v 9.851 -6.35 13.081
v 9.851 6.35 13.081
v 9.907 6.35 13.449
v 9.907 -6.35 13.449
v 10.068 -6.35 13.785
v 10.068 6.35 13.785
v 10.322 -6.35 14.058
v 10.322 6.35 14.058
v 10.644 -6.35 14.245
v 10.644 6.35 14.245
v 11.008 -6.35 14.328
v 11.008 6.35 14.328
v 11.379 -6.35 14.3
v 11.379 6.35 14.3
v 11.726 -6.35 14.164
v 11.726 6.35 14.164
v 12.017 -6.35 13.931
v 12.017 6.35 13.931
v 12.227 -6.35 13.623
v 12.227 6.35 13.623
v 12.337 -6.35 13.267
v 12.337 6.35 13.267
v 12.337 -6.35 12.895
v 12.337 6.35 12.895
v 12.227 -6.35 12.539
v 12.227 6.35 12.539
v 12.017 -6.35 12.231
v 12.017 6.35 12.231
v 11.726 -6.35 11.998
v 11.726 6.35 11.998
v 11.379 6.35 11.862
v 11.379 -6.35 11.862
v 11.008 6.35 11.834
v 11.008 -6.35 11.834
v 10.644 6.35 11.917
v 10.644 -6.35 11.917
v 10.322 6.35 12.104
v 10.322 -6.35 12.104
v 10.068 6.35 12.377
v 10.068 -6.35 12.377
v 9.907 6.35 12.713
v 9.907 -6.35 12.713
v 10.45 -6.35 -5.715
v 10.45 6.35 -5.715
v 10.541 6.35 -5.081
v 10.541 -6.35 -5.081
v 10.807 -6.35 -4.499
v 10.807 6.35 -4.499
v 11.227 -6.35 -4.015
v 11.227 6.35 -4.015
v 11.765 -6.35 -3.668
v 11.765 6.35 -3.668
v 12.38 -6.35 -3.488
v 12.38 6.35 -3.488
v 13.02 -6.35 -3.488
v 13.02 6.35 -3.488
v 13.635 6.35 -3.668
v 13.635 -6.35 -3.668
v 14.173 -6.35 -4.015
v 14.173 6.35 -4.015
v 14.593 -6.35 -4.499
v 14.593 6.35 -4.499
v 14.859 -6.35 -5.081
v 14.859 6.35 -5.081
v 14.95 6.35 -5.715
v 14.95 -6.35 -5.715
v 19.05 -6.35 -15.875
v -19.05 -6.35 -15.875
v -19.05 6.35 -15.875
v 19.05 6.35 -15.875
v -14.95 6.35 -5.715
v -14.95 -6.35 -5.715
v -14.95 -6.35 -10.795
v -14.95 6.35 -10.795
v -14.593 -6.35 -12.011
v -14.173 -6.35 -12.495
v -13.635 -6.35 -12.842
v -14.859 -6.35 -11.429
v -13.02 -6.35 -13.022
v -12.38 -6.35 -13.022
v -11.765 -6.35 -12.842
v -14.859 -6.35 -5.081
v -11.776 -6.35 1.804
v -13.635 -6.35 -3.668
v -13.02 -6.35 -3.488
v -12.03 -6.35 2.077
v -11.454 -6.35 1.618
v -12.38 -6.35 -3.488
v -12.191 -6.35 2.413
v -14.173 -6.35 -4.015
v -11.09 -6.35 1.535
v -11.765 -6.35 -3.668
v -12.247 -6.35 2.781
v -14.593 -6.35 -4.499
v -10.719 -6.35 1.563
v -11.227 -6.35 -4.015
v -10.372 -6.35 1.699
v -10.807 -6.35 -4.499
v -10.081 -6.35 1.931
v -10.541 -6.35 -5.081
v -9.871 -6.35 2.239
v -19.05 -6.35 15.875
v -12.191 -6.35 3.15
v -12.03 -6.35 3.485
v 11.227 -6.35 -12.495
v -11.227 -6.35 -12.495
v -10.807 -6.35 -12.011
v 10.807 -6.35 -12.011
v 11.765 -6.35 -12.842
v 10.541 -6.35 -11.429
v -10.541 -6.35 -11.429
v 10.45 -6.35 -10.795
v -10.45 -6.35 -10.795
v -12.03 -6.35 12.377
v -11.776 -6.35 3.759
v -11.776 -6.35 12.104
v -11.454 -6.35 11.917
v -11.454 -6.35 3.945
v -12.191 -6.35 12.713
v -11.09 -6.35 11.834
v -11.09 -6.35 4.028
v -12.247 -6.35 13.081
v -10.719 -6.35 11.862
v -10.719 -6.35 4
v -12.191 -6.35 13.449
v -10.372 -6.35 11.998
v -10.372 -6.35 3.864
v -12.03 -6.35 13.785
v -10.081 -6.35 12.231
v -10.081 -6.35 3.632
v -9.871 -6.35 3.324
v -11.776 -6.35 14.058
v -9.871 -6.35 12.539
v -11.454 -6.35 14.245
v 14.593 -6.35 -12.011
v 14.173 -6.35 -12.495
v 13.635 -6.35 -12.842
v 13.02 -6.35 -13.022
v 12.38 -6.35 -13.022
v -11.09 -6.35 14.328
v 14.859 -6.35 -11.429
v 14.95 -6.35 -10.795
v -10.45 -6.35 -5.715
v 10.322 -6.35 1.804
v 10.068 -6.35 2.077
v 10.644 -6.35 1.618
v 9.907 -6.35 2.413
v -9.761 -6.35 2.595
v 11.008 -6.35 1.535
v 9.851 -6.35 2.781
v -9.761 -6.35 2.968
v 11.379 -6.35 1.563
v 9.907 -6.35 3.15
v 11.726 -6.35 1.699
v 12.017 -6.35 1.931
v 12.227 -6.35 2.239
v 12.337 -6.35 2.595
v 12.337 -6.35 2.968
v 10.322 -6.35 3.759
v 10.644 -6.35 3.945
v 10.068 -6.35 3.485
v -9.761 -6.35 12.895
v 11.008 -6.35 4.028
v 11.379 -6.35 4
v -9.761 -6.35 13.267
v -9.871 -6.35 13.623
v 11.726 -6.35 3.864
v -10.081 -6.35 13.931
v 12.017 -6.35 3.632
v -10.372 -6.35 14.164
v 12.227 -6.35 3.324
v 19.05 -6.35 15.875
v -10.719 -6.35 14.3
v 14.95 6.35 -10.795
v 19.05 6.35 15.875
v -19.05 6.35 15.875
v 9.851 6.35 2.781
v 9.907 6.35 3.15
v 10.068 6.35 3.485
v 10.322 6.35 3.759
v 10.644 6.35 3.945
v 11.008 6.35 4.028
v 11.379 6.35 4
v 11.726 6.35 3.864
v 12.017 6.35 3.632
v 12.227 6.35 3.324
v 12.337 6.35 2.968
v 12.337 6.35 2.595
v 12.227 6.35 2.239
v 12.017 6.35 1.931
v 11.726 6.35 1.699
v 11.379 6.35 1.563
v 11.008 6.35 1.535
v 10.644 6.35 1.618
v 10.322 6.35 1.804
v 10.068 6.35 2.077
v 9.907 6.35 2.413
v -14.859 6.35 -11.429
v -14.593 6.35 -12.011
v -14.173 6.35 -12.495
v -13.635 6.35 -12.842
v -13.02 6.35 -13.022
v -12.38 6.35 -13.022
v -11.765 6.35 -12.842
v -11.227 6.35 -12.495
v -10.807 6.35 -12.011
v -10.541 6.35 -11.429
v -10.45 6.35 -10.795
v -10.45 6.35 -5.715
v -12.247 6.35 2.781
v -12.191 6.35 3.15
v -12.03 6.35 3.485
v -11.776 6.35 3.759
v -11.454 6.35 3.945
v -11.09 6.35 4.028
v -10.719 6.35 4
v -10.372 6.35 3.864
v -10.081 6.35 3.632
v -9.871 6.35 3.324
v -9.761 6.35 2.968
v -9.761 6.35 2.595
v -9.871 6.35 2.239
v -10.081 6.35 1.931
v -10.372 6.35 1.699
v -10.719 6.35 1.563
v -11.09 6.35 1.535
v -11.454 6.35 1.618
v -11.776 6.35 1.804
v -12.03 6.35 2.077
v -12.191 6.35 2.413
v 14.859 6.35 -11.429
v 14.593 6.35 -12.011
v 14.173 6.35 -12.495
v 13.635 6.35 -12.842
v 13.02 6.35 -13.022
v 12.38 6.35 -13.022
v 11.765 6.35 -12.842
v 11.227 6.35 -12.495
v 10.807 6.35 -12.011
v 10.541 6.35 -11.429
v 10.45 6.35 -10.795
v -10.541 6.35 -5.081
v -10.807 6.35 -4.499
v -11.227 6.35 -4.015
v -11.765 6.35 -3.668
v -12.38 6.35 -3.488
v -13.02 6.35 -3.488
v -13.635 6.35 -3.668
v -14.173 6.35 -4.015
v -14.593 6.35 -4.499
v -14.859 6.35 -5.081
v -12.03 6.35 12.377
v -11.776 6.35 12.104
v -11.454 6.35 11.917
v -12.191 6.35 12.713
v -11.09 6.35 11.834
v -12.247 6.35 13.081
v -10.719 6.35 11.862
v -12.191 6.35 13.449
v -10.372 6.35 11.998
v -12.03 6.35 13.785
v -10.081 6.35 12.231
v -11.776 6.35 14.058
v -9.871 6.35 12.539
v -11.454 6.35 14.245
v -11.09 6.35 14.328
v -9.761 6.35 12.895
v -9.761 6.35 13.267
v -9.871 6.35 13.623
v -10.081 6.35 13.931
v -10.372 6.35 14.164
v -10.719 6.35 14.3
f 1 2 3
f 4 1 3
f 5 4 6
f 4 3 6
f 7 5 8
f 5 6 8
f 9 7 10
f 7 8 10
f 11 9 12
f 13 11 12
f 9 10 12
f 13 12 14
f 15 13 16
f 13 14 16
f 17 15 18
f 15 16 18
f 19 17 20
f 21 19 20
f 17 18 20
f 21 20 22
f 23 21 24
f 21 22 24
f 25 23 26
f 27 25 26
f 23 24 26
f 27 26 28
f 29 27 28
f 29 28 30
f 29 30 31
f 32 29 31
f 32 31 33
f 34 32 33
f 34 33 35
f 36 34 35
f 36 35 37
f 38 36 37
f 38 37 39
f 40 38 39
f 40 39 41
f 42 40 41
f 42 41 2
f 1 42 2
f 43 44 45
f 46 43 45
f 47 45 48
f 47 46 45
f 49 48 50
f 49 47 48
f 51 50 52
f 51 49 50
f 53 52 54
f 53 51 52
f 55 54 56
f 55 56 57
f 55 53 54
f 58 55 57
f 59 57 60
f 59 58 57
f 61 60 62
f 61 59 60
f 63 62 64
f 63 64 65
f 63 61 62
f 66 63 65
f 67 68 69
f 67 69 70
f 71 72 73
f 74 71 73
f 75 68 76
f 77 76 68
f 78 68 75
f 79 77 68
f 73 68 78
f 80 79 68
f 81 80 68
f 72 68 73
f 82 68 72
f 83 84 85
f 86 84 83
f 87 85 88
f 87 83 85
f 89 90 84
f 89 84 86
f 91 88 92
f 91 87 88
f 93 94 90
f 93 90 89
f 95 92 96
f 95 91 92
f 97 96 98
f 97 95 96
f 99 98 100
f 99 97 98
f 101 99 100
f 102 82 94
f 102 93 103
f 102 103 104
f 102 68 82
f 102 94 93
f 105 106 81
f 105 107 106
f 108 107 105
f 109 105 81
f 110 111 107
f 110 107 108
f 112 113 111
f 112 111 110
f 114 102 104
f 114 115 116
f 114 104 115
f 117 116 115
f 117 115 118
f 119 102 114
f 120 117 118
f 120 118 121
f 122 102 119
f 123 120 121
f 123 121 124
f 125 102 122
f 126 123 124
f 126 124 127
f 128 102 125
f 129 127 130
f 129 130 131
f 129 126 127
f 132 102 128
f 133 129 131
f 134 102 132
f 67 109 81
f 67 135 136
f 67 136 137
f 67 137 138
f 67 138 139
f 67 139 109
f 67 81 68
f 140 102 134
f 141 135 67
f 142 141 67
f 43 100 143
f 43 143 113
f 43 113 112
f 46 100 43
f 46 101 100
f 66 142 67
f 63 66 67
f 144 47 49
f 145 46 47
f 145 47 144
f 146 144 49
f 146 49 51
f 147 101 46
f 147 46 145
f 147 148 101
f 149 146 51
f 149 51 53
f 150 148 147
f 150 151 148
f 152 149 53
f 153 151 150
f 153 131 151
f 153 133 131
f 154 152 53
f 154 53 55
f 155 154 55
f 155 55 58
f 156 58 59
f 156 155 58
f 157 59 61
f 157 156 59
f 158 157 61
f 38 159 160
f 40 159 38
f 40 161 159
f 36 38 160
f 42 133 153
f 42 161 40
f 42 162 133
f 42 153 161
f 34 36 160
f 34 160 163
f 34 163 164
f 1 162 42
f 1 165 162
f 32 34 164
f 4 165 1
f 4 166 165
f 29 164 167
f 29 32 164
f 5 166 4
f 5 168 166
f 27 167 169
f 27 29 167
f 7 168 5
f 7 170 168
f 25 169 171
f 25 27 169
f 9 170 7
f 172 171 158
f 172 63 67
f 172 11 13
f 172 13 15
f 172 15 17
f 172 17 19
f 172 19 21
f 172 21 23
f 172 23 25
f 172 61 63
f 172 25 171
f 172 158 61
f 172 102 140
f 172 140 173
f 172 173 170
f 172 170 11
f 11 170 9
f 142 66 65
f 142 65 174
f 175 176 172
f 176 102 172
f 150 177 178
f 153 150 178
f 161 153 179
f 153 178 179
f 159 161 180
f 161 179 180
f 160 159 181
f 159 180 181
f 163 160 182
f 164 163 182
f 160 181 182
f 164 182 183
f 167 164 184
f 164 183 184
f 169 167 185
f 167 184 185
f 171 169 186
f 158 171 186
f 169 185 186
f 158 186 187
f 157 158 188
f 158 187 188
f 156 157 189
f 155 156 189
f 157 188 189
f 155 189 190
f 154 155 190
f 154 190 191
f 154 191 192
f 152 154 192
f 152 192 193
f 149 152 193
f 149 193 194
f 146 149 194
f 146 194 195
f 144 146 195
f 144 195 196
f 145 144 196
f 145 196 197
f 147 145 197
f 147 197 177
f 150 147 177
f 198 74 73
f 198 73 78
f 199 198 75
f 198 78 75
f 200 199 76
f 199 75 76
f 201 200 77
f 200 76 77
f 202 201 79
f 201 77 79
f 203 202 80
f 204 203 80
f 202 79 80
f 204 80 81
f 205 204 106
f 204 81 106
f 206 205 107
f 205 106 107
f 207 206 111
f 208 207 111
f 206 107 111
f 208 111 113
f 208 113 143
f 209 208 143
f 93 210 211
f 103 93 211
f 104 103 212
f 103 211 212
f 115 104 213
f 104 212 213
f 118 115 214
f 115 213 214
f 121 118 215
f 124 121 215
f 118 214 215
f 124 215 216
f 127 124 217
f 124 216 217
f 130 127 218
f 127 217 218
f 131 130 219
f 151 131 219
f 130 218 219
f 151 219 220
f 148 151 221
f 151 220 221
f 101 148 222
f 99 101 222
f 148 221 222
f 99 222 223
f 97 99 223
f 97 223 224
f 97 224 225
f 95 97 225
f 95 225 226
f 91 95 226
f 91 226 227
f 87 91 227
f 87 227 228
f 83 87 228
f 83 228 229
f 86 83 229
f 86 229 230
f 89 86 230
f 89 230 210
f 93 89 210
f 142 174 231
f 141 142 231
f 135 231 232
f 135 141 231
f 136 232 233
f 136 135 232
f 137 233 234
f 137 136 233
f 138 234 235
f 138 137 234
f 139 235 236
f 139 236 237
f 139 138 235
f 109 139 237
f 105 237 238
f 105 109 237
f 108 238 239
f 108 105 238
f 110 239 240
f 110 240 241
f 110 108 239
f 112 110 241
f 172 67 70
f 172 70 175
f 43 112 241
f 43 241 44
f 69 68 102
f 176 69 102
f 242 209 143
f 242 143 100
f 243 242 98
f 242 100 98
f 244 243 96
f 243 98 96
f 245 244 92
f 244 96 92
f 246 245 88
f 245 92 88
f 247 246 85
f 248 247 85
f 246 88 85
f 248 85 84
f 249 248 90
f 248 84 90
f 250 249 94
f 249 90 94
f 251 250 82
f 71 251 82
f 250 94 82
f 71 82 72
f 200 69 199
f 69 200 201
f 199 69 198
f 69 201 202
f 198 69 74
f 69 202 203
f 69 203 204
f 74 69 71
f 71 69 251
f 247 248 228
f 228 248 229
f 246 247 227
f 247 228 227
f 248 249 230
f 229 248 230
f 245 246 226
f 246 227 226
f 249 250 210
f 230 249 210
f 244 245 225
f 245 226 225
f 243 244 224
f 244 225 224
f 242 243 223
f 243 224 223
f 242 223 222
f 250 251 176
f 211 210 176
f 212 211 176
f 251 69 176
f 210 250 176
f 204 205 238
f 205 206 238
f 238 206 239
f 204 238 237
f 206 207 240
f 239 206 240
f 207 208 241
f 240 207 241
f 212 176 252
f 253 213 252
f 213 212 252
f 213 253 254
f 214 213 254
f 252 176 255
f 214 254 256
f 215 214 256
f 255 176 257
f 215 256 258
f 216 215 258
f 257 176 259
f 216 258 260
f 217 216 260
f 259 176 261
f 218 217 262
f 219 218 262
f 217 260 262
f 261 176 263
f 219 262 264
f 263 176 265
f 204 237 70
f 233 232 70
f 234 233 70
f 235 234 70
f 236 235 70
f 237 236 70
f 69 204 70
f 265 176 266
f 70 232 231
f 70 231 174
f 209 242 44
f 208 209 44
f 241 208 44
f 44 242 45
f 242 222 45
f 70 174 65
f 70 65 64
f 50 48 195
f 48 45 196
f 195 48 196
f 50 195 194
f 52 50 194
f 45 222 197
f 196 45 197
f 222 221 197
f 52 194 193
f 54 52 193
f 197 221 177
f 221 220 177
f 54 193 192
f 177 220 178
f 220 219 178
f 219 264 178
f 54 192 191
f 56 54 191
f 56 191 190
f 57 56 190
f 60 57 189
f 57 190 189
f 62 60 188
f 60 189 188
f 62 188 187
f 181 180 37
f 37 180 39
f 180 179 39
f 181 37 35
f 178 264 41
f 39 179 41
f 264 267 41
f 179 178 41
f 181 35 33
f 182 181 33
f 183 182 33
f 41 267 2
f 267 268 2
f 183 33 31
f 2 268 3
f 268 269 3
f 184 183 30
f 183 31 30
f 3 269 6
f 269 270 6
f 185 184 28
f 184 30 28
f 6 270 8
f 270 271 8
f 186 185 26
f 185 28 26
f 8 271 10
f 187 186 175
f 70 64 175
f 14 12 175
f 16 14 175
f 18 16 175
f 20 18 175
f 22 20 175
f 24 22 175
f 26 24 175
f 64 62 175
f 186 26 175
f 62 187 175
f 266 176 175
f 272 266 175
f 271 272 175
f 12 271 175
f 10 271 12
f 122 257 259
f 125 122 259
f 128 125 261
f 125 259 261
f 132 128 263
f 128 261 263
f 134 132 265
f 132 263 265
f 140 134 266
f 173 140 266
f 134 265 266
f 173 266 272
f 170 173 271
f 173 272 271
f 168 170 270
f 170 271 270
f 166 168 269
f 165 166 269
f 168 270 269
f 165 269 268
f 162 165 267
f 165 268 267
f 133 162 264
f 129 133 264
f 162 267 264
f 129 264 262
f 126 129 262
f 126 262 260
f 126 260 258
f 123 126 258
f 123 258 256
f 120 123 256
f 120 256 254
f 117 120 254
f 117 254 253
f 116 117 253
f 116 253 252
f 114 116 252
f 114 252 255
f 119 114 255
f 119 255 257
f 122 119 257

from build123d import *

# Parameters (mm, degrees)
F0_W     = 38.1
F0_H     = 31.75
F1_DEPTH = 6.35
F3_D     = 2.5
F5_DEPTH = 12.7


# Not quite as in the source:
# - a pattern or mirror of a feature is missing from the dataset's text; its kind, count and spacing are read off the source's solid


with BuildPart() as f1:
    # F0 (on Front) → F1 (new body, symmetric)
    with BuildSketch(Plane.XZ):
        Rectangle(F0_W, F0_H)
    extrude(amount=F1_DEPTH, both=True)

    # F3 (through all)
    with Locations(Plane.XZ.offset(6.35)):
        with Locations((-10.99693, 2.7813), (11.10107, 13.081), (-10.99693, 13.081), (11.10107, 2.7813)):
            Hole(F3_D / 2)

    # F4 (on face) → F5 (cut, through all)
    with BuildSketch(Plane.XZ.offset(6.35)):
        with BuildLine():
            ThreePointArc((-10.45, -5.715), (-12.7, -3.465), (-14.95, -5.715))
            Line((-14.95, -5.715), (-14.95, -10.795))
            ThreePointArc((-14.95, -10.795), (-12.7, -13.045), (-10.45, -10.795))
            Line((-10.45, -10.795), (-10.45, -5.715))
        make_face()
    f5 = extrude(amount=-F5_DEPTH, mode=Mode.SUBTRACT)

    # F5_copies: F5 across plane
    add(f5.mirror(Plane(origin=(0, 0, 0), x_dir=(0, 0, 1), z_dir=(1, 0, 0))), mode=Mode.SUBTRACT)


solid = f1.part
